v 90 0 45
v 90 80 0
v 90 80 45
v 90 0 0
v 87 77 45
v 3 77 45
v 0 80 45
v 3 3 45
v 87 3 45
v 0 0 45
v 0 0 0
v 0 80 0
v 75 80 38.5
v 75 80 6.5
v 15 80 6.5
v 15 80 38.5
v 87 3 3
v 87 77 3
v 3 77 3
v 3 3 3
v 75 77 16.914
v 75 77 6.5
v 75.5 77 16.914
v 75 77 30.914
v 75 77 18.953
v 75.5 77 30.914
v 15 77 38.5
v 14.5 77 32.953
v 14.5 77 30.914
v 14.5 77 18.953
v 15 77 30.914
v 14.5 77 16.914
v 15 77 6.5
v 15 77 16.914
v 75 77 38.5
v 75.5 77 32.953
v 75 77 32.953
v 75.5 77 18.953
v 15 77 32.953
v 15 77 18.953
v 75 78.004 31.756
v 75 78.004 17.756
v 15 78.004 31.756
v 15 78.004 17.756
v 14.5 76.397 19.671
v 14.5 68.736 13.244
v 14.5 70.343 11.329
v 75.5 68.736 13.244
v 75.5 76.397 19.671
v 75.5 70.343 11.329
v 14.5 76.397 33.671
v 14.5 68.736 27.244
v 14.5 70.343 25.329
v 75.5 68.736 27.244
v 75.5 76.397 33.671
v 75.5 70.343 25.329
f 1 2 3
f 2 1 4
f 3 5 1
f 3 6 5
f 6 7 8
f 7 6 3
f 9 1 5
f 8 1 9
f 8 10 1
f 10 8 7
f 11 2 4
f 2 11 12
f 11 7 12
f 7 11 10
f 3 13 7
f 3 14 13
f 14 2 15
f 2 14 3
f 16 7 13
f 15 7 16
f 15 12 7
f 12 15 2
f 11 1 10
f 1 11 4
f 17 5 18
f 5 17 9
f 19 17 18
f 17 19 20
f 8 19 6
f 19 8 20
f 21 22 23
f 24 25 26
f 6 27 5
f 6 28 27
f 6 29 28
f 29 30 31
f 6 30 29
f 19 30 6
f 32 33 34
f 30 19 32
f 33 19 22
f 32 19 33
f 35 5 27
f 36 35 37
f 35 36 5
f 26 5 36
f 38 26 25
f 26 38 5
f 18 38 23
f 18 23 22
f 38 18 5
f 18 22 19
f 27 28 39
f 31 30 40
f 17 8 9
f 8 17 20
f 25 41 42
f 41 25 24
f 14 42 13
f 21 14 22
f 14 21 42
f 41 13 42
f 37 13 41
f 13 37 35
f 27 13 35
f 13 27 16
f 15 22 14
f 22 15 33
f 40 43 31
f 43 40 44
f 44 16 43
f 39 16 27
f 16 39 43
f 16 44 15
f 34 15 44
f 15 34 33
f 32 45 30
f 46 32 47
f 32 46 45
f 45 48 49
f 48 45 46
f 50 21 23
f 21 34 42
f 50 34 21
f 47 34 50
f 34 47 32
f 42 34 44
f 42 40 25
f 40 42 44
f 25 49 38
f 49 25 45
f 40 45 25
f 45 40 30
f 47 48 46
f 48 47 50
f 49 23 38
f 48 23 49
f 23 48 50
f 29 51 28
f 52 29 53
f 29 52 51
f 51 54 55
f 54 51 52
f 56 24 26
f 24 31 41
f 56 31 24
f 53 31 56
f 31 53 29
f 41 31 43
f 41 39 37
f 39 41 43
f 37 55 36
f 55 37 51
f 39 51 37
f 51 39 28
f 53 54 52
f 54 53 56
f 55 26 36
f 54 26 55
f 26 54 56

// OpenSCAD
$fn = 32;

// ----------------------------------------------------------------------
// Vent box: louvers enclosure
// ----------------------------------------------------------------------

// --- parameters (mm) ---
box_l = 90;               // box length, X
box_w = 80;               // box width, Y
box_h = 45;               // box height, Z
wall_t = 3;               // shell wall thickness
win_l = 60;               // vent window width, X
win_h = 32;               // vent window height, Z
slat_t = 2.5;             // louver slat thickness
slat_d = 10;              // louver slat depth
slat_a = 40;              // louver slat angle, degrees
slat_pitch = 14;          // louver pitch
slat_yc = 73.37;          // slat centreline Y
fit_tol = 0.05;           // tolerance for press fits, mm
free_tol = 0.3;           // tolerance for clearance fits, mm

win_z0 = (box_h - win_h) / 2;  // window lower edge Z
n_slats = 2;  // louver count
slat_z0 = win_z0 + (win_h - (n_slats - 1) * slat_pitch) / 2;

difference() {
  union() {
    difference() {
      cube([box_l, box_w, box_h]);
  translate([wall_t, wall_t, wall_t])
    cube([box_l - 2 * wall_t, box_w - 2 * wall_t, box_h]);
  translate([(box_l - win_l) / 2, box_w - wall_t - 1, win_z0])
    cube([win_l, wall_t + 2, win_h]);
    }
    for (i = [0 : n_slats - 1])
      translate([box_l / 2, slat_yc, slat_z0 + i * slat_pitch])
        rotate([slat_a, 0, 0])
          cube([win_l + 1, slat_d, slat_t], center = true);
  }
}
